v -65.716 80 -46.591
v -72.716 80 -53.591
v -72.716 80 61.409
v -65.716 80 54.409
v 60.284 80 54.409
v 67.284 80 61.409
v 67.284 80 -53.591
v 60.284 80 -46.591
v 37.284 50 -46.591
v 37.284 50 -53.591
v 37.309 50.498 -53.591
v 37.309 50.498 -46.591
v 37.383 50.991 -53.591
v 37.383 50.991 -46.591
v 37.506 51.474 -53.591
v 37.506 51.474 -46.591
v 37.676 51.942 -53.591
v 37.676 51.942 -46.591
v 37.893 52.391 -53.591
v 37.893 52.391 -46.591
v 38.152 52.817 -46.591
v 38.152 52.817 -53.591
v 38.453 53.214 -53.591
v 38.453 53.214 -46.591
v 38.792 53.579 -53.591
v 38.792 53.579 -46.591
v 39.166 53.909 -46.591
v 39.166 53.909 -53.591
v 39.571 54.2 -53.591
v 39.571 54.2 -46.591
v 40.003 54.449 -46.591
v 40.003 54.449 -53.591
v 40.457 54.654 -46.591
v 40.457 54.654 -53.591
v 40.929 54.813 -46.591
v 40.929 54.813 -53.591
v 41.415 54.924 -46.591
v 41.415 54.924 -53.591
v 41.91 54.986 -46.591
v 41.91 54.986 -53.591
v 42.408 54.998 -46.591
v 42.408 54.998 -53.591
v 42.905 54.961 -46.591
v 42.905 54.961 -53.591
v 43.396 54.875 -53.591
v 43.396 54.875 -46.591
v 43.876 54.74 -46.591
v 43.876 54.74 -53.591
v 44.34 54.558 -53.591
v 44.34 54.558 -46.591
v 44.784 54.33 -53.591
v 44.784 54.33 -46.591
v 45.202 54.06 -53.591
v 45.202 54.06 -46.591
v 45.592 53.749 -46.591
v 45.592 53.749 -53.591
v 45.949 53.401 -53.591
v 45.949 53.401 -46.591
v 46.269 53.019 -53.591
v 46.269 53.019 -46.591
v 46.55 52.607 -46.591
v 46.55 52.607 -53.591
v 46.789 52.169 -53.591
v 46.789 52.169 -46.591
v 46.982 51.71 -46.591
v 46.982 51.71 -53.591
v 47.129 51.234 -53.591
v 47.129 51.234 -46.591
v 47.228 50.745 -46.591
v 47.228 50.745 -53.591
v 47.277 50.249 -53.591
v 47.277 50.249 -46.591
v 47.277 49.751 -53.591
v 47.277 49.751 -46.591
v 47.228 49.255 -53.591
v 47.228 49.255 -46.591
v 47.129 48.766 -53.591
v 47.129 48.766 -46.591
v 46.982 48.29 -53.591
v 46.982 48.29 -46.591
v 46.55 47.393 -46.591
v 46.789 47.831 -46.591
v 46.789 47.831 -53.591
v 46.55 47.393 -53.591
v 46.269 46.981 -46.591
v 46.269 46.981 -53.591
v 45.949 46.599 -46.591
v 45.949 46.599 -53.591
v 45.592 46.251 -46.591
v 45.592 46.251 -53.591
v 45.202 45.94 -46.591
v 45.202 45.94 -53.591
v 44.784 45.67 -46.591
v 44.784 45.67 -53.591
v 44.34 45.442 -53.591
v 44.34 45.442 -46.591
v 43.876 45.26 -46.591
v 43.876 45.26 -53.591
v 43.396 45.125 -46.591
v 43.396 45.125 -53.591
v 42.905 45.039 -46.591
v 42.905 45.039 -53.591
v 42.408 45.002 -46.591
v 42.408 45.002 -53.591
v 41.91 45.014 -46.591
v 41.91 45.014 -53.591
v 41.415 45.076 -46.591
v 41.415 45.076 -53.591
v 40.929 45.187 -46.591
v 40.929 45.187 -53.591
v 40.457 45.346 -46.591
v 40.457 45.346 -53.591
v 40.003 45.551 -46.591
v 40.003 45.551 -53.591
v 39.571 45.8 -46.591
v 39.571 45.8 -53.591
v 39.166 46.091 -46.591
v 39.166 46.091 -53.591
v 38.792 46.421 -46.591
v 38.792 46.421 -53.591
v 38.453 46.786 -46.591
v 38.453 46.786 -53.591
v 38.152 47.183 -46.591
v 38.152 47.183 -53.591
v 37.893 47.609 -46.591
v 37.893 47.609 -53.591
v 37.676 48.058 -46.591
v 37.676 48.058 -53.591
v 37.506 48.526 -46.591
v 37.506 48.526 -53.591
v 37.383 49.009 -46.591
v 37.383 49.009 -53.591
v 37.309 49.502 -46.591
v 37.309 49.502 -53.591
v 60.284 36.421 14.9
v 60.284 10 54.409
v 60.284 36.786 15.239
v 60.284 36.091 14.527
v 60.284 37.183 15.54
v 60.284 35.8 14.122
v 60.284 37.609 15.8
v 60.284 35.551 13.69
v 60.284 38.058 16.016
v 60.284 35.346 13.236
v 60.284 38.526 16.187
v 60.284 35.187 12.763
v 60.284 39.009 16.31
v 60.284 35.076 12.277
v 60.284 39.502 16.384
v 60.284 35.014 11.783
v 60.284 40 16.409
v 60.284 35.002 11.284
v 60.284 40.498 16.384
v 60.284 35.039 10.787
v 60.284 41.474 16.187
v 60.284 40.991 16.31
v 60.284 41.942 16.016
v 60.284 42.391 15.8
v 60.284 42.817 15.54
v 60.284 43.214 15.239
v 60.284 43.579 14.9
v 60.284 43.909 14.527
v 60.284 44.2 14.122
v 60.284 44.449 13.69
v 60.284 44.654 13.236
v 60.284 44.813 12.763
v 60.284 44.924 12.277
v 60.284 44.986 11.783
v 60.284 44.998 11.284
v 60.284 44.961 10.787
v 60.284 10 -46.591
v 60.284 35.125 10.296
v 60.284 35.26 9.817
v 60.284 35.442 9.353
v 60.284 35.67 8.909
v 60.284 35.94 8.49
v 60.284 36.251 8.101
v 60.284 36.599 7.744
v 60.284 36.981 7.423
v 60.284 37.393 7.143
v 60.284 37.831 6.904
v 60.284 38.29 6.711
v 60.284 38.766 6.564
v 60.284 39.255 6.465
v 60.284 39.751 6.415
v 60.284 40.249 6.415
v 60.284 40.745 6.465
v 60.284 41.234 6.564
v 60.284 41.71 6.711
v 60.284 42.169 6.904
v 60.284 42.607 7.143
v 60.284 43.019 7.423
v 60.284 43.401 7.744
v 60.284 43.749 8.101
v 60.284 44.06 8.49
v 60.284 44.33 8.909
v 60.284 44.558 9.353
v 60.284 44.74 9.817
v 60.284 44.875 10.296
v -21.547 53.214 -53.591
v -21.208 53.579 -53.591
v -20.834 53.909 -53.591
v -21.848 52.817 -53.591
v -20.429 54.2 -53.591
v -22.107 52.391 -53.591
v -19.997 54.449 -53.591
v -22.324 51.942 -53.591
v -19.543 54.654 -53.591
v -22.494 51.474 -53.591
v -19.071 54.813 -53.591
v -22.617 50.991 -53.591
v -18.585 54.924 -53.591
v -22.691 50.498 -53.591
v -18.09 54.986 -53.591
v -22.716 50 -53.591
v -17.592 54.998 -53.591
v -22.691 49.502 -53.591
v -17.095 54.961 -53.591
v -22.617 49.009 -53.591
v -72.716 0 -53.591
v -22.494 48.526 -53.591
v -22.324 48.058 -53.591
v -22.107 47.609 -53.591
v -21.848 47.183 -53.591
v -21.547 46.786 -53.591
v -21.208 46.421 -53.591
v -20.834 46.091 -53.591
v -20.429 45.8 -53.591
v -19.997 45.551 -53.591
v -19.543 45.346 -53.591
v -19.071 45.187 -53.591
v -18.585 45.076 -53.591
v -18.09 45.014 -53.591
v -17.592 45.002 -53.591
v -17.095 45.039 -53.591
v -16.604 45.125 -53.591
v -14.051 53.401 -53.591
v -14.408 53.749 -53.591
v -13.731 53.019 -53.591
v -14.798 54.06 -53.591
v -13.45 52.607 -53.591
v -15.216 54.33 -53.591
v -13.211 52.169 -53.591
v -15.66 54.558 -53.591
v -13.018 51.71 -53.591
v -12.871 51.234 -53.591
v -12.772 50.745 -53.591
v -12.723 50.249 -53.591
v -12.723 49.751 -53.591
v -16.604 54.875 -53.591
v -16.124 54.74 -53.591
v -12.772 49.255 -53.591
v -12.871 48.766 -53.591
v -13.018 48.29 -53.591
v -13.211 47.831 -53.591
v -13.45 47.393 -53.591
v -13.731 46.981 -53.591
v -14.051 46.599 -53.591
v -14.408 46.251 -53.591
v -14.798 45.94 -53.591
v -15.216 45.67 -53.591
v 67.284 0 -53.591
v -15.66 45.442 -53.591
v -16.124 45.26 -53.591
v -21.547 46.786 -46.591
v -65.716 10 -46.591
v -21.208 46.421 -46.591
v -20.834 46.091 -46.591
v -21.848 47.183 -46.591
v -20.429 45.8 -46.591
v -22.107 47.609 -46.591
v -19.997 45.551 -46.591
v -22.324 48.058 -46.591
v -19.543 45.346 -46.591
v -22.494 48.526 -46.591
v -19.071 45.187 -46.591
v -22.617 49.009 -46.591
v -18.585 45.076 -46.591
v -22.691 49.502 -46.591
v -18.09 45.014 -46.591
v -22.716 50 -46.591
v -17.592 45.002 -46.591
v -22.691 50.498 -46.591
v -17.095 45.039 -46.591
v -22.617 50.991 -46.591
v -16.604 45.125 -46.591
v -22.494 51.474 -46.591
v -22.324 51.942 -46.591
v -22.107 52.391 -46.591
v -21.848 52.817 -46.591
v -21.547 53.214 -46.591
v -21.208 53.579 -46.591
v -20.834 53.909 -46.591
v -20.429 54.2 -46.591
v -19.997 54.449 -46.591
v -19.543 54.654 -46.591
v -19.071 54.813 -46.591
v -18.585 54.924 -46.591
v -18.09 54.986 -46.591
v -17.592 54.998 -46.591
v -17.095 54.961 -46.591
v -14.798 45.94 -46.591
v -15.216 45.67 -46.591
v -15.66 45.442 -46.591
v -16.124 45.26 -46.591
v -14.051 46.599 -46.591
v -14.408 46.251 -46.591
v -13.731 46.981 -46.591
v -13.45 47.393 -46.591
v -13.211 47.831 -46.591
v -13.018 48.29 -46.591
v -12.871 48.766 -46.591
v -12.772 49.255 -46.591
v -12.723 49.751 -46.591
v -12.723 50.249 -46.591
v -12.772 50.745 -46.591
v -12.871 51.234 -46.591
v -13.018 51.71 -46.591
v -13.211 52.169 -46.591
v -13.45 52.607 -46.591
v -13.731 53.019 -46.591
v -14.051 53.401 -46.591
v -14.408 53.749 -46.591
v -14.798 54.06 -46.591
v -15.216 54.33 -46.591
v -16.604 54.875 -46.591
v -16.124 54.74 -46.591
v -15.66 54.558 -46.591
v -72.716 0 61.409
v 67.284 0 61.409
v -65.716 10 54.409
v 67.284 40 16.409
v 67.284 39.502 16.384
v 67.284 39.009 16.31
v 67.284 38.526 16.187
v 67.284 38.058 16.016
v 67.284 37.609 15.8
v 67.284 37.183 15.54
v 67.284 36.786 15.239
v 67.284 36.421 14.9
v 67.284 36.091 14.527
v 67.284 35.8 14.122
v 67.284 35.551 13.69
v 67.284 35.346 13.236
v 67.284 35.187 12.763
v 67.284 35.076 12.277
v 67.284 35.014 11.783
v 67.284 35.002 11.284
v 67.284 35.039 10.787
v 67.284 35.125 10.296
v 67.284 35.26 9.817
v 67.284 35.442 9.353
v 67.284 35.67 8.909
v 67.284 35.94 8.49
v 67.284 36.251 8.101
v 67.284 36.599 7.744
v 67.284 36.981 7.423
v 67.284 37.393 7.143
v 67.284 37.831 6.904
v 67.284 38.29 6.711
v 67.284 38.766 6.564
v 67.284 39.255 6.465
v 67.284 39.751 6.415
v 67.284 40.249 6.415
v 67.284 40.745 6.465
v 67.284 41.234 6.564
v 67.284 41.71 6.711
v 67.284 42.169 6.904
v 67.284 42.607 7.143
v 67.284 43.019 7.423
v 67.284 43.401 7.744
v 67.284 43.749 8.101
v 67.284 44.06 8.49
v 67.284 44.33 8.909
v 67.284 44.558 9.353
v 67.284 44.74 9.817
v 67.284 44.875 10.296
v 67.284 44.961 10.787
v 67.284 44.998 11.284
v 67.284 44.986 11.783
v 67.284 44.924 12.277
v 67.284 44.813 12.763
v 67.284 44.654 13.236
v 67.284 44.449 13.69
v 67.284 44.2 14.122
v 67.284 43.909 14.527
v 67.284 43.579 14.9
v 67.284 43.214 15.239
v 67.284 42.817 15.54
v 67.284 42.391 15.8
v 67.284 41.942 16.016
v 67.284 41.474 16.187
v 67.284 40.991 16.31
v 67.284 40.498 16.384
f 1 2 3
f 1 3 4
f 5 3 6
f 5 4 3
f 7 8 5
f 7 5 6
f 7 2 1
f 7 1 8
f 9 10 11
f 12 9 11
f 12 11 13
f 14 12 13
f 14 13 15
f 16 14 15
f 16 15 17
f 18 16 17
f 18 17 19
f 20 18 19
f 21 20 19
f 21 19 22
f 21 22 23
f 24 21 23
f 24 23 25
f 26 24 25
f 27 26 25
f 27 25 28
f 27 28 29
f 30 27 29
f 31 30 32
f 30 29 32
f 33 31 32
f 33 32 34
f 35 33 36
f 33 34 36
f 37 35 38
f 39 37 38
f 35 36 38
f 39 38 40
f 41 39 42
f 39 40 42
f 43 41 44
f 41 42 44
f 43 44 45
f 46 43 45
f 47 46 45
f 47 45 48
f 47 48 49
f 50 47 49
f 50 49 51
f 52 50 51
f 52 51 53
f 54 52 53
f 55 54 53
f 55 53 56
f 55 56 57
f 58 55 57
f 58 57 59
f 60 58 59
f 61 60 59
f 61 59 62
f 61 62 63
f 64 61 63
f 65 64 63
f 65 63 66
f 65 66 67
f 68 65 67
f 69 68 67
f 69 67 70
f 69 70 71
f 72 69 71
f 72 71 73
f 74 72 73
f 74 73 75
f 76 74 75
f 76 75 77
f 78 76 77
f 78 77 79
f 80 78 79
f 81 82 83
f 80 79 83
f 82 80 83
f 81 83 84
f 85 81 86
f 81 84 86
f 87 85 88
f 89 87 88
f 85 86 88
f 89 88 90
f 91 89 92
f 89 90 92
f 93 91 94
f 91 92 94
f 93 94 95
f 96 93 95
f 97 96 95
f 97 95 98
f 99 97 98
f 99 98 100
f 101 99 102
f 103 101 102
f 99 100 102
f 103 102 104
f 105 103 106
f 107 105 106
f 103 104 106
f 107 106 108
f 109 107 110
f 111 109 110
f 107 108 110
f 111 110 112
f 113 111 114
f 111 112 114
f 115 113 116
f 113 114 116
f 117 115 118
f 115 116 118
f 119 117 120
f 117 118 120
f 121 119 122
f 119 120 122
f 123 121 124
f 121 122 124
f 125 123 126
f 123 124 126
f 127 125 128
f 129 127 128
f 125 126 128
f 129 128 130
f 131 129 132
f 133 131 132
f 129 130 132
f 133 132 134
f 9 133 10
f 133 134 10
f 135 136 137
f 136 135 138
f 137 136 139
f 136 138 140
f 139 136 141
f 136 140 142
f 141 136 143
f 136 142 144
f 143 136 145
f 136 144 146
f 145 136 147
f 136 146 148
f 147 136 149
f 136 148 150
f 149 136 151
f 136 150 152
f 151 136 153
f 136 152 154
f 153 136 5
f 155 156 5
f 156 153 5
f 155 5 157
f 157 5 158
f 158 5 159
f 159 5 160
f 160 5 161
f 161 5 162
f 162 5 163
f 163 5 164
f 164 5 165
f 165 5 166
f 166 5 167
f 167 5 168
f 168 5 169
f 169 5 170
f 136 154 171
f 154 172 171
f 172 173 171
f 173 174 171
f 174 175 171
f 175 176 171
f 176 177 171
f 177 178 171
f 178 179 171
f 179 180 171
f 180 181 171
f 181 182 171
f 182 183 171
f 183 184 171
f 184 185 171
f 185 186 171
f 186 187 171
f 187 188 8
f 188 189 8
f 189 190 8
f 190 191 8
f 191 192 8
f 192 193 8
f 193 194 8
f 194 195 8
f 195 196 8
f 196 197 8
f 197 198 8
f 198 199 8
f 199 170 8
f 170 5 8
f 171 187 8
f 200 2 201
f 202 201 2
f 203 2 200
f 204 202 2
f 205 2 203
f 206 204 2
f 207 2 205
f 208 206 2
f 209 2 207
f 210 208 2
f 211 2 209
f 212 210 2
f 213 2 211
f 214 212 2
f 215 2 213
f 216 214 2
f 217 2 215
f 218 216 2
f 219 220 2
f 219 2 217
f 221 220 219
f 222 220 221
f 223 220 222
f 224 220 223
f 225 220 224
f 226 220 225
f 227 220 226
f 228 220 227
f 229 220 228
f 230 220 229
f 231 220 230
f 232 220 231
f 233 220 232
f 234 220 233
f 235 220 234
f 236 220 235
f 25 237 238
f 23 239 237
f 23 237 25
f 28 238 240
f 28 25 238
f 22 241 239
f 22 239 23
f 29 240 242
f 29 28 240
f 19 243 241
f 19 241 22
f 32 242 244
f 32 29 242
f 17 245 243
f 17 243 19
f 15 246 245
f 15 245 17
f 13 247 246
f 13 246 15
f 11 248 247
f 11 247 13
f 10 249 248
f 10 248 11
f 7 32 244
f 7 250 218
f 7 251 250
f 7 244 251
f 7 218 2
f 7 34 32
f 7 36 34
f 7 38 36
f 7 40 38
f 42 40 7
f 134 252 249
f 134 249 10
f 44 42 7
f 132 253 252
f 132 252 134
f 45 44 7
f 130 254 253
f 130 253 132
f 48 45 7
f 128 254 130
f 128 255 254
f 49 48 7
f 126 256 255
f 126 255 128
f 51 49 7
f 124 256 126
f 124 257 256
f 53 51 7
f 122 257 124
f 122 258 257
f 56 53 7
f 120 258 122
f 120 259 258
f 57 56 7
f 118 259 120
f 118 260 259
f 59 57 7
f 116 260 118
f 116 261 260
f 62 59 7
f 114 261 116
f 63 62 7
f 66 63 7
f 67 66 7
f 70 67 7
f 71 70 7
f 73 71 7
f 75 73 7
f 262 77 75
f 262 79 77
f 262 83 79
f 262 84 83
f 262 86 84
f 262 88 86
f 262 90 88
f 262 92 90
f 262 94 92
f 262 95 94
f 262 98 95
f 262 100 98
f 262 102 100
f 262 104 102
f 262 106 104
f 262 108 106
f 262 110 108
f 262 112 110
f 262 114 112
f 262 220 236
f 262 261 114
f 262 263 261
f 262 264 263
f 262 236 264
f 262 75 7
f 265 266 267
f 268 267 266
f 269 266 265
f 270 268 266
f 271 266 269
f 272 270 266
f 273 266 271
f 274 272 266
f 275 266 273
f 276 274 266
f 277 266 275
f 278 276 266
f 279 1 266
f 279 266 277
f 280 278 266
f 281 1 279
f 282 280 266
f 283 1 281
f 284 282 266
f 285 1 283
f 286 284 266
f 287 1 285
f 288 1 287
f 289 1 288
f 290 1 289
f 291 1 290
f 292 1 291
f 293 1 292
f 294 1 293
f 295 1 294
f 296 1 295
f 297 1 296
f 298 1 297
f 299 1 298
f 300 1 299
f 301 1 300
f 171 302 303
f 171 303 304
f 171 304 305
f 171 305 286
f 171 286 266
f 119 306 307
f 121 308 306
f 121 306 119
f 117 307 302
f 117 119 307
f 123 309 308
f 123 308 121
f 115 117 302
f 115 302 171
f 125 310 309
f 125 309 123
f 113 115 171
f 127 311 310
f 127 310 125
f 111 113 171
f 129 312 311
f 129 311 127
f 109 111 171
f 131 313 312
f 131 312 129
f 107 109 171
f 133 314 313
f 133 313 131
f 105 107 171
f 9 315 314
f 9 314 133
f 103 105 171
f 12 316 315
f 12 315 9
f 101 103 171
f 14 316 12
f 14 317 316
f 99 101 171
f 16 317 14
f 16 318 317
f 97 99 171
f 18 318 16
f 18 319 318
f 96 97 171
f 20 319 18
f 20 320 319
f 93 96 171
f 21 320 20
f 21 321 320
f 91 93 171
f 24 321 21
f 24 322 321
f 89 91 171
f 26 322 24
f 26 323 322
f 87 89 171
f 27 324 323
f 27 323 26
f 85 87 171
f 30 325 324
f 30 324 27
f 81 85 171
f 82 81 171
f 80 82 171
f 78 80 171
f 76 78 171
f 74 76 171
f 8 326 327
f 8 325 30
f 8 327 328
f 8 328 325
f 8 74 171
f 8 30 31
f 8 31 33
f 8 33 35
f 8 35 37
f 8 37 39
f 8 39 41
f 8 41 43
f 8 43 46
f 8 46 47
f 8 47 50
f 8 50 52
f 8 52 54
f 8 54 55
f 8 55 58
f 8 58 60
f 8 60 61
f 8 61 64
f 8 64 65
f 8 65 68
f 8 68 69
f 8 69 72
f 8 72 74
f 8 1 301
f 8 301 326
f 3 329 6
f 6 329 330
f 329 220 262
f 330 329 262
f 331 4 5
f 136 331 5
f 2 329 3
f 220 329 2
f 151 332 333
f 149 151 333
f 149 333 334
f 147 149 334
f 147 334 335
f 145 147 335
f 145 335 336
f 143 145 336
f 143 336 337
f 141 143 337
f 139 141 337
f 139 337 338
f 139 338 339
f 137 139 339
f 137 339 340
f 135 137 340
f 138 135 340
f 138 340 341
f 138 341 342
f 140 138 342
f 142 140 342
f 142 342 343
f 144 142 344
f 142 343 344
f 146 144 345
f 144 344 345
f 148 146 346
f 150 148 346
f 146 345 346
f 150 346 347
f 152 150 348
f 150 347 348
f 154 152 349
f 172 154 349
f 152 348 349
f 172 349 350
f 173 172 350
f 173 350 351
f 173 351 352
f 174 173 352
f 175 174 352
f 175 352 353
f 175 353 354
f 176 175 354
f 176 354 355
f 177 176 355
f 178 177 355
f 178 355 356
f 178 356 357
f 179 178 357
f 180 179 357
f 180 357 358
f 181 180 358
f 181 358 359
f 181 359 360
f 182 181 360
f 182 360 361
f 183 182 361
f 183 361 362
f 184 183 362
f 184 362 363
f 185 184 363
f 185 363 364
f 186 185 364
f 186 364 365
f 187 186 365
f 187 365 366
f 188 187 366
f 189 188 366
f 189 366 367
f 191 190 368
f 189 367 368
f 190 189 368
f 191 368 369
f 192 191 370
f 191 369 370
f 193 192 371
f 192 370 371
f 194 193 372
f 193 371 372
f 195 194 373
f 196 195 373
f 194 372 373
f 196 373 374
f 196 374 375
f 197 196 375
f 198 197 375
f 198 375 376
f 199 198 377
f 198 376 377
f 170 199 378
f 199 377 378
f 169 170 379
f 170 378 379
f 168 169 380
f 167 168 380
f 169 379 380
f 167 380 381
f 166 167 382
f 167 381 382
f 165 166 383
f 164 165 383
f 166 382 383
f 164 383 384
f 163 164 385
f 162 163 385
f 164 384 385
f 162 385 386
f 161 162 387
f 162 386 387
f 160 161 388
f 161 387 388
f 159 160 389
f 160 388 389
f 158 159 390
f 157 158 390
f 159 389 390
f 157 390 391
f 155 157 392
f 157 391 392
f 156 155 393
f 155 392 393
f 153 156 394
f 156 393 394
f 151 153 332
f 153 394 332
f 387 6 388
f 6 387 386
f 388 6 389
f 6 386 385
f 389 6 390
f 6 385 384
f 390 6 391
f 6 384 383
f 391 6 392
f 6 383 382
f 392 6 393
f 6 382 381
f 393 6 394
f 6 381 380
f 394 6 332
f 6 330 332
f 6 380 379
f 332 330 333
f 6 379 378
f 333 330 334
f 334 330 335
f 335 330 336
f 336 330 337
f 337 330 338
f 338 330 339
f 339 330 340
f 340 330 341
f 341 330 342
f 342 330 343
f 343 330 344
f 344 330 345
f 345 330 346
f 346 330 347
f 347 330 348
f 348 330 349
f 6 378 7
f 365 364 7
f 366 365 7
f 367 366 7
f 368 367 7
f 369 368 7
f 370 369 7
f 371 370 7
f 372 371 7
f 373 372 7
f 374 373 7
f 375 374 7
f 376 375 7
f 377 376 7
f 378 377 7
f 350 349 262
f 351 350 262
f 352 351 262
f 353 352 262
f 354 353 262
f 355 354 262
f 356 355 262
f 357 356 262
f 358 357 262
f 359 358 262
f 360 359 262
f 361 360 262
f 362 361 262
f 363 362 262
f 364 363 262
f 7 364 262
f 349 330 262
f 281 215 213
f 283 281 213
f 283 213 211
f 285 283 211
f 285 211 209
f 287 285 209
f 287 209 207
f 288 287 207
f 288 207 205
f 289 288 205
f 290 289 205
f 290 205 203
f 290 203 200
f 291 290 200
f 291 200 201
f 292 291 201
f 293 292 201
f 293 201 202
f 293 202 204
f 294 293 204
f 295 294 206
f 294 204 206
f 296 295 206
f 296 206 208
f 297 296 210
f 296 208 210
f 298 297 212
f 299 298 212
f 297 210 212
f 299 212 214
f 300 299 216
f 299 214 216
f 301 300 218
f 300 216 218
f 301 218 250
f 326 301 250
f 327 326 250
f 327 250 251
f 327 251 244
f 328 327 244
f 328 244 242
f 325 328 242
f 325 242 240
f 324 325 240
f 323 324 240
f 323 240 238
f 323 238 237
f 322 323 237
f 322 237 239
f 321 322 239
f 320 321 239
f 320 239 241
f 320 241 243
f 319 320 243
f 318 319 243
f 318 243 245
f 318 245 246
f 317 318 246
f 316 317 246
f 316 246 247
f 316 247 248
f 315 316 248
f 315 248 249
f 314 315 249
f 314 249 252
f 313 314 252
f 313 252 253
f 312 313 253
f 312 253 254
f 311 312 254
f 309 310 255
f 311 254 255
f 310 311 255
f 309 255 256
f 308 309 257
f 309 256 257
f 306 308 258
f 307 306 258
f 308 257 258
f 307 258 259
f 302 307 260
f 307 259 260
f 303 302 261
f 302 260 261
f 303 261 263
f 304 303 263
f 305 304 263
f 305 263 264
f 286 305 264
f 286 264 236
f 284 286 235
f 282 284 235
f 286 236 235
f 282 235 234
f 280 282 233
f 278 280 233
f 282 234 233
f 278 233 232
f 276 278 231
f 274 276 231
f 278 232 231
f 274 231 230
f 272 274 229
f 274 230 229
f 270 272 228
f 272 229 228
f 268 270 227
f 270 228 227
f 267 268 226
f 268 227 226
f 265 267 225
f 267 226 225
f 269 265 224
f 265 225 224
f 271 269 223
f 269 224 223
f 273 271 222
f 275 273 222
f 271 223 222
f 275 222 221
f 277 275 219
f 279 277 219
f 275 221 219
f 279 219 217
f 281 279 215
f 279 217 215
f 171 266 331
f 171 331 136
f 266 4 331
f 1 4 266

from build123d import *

# Parameters (mm, degrees)
SKETCH1_W                        = 140
SKETCH1_H                        = 115
BOSS_EXTRUDE1_DEPTH              = 80
SKETCH2_W                        = 126
SKETCH2_H                        = 101
CUT_EXTRUDE1_DEPTH               = 70
M10X1_0_TAPPED_HOLE1_D           = 9
M10X1_0_TAPPED_HOLE1_DEPTH       = 23
M10X1_0_TAPPED_HOLE1_CBORE_D     = 10
M10X1_0_TAPPED_HOLE1_CBORE_DEPTH = 20
M10X1_0_TAPPED_HOLE1_TIP         = 2.703872786
M10X1_0_TAPPED_HOLE2_D           = 9
M10X1_0_TAPPED_HOLE2_DEPTH       = 23
M10X1_0_TAPPED_HOLE2_CBORE_D     = 10
M10X1_0_TAPPED_HOLE2_CBORE_DEPTH = 20
M10X1_0_TAPPED_HOLE2_TIP         = 2.703872786


with BuildPart() as part:
    # Sketch1 → Boss-Extrude1 (new body)
    with BuildSketch(Plane(origin=(0, 0, 0), x_dir=(1, 0, 0), z_dir=(0, 1, 0))):
        with Locations((-2.716319444, -3.909068683)):
            Rectangle(SKETCH1_W, SKETCH1_H)
    extrude(amount=BOSS_EXTRUDE1_DEPTH)

    # Sketch2 → Cut-Extrude1 (cut)
    with BuildSketch(Plane(origin=(0, 80, 0), x_dir=(1, 0, 0), z_dir=(0, 1, 0))):
        with Locations((-2.716319444, -3.909068683)):
            Rectangle(SKETCH2_W, SKETCH2_H)
    extrude(amount=-CUT_EXTRUDE1_DEPTH, mode=Mode.SUBTRACT)

    # M10x1.0 Tapped Hole1
    with Locations(Plane(origin=(-17.716319444, 50, -53.590931317), x_dir=(-1, 0, 0), z_dir=(0, 0, -1))):
        with Locations((0, 0), (-60, 0)):
            CounterBoreHole(M10X1_0_TAPPED_HOLE1_D / 2, M10X1_0_TAPPED_HOLE1_CBORE_D / 2, M10X1_0_TAPPED_HOLE1_CBORE_DEPTH, depth=M10X1_0_TAPPED_HOLE1_DEPTH)
            with Locations((0, 0, -(M10X1_0_TAPPED_HOLE1_DEPTH + M10X1_0_TAPPED_HOLE1_TIP / 2))):  # 118° drill point
                Cone(0, M10X1_0_TAPPED_HOLE1_D / 2, M10X1_0_TAPPED_HOLE1_TIP, mode=Mode.SUBTRACT)

    # M10x1.0 Tapped Hole2
    with Locations(Plane(origin=(67.283680556, 40, 11.409068683), x_dir=(0, 0, 1), z_dir=(1, 0, 0))):
        with Locations((0, 0)):
            CounterBoreHole(M10X1_0_TAPPED_HOLE2_D / 2, M10X1_0_TAPPED_HOLE2_CBORE_D / 2, M10X1_0_TAPPED_HOLE2_CBORE_DEPTH, depth=M10X1_0_TAPPED_HOLE2_DEPTH)
            with Locations((0, 0, -(M10X1_0_TAPPED_HOLE2_DEPTH + M10X1_0_TAPPED_HOLE2_TIP / 2))):  # 118° drill point
                Cone(0, M10X1_0_TAPPED_HOLE2_D / 2, M10X1_0_TAPPED_HOLE2_TIP, mode=Mode.SUBTRACT)


solid = part.part
